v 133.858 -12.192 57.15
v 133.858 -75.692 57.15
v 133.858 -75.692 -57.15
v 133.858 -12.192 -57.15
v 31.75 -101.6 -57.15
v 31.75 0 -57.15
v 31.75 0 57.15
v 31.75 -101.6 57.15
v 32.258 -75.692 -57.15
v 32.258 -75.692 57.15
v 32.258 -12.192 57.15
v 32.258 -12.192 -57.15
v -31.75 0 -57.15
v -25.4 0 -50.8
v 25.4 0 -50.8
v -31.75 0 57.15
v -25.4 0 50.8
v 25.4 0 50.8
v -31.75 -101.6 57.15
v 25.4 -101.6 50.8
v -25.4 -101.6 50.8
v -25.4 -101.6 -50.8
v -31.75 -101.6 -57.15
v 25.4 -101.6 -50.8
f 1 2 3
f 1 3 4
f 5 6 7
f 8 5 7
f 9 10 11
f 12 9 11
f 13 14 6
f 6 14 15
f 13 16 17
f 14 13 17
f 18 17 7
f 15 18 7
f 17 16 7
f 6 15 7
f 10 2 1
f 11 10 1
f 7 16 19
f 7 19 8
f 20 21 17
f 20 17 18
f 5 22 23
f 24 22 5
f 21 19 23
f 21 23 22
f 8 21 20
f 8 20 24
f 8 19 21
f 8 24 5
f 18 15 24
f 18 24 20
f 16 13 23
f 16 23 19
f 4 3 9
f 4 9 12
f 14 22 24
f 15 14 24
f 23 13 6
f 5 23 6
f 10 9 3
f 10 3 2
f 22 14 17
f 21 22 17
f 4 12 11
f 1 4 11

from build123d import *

# Parameters (mm, degrees)
F0_W     = 63.5
F0_H     = 114.3
F0_W_2   = 50.8
F0_H_2   = 101.6
F1_DEPTH = 101.6
F3_W     = 63.5
F3_H     = 114.3
F4_DEPTH = 101.6


with BuildPart() as f1:
    # F0 (on Front) → F1 (new body)
    with BuildSketch(Plane.XZ):
        Rectangle(F0_W, F0_H)
        Rectangle(F0_W_2, F0_H_2, mode=Mode.SUBTRACT)
    extrude(amount=F1_DEPTH)


with BuildPart() as f4:
    # F3 (on offset) → F4 (new body)
    with BuildSketch(Plane.YZ.offset(32.258)):
        with Locations((-43.9423679346, 0)):
            Rectangle(F3_W, F3_H)
    extrude(amount=F4_DEPTH)


solid = Compound([f1.part, f4.part])
